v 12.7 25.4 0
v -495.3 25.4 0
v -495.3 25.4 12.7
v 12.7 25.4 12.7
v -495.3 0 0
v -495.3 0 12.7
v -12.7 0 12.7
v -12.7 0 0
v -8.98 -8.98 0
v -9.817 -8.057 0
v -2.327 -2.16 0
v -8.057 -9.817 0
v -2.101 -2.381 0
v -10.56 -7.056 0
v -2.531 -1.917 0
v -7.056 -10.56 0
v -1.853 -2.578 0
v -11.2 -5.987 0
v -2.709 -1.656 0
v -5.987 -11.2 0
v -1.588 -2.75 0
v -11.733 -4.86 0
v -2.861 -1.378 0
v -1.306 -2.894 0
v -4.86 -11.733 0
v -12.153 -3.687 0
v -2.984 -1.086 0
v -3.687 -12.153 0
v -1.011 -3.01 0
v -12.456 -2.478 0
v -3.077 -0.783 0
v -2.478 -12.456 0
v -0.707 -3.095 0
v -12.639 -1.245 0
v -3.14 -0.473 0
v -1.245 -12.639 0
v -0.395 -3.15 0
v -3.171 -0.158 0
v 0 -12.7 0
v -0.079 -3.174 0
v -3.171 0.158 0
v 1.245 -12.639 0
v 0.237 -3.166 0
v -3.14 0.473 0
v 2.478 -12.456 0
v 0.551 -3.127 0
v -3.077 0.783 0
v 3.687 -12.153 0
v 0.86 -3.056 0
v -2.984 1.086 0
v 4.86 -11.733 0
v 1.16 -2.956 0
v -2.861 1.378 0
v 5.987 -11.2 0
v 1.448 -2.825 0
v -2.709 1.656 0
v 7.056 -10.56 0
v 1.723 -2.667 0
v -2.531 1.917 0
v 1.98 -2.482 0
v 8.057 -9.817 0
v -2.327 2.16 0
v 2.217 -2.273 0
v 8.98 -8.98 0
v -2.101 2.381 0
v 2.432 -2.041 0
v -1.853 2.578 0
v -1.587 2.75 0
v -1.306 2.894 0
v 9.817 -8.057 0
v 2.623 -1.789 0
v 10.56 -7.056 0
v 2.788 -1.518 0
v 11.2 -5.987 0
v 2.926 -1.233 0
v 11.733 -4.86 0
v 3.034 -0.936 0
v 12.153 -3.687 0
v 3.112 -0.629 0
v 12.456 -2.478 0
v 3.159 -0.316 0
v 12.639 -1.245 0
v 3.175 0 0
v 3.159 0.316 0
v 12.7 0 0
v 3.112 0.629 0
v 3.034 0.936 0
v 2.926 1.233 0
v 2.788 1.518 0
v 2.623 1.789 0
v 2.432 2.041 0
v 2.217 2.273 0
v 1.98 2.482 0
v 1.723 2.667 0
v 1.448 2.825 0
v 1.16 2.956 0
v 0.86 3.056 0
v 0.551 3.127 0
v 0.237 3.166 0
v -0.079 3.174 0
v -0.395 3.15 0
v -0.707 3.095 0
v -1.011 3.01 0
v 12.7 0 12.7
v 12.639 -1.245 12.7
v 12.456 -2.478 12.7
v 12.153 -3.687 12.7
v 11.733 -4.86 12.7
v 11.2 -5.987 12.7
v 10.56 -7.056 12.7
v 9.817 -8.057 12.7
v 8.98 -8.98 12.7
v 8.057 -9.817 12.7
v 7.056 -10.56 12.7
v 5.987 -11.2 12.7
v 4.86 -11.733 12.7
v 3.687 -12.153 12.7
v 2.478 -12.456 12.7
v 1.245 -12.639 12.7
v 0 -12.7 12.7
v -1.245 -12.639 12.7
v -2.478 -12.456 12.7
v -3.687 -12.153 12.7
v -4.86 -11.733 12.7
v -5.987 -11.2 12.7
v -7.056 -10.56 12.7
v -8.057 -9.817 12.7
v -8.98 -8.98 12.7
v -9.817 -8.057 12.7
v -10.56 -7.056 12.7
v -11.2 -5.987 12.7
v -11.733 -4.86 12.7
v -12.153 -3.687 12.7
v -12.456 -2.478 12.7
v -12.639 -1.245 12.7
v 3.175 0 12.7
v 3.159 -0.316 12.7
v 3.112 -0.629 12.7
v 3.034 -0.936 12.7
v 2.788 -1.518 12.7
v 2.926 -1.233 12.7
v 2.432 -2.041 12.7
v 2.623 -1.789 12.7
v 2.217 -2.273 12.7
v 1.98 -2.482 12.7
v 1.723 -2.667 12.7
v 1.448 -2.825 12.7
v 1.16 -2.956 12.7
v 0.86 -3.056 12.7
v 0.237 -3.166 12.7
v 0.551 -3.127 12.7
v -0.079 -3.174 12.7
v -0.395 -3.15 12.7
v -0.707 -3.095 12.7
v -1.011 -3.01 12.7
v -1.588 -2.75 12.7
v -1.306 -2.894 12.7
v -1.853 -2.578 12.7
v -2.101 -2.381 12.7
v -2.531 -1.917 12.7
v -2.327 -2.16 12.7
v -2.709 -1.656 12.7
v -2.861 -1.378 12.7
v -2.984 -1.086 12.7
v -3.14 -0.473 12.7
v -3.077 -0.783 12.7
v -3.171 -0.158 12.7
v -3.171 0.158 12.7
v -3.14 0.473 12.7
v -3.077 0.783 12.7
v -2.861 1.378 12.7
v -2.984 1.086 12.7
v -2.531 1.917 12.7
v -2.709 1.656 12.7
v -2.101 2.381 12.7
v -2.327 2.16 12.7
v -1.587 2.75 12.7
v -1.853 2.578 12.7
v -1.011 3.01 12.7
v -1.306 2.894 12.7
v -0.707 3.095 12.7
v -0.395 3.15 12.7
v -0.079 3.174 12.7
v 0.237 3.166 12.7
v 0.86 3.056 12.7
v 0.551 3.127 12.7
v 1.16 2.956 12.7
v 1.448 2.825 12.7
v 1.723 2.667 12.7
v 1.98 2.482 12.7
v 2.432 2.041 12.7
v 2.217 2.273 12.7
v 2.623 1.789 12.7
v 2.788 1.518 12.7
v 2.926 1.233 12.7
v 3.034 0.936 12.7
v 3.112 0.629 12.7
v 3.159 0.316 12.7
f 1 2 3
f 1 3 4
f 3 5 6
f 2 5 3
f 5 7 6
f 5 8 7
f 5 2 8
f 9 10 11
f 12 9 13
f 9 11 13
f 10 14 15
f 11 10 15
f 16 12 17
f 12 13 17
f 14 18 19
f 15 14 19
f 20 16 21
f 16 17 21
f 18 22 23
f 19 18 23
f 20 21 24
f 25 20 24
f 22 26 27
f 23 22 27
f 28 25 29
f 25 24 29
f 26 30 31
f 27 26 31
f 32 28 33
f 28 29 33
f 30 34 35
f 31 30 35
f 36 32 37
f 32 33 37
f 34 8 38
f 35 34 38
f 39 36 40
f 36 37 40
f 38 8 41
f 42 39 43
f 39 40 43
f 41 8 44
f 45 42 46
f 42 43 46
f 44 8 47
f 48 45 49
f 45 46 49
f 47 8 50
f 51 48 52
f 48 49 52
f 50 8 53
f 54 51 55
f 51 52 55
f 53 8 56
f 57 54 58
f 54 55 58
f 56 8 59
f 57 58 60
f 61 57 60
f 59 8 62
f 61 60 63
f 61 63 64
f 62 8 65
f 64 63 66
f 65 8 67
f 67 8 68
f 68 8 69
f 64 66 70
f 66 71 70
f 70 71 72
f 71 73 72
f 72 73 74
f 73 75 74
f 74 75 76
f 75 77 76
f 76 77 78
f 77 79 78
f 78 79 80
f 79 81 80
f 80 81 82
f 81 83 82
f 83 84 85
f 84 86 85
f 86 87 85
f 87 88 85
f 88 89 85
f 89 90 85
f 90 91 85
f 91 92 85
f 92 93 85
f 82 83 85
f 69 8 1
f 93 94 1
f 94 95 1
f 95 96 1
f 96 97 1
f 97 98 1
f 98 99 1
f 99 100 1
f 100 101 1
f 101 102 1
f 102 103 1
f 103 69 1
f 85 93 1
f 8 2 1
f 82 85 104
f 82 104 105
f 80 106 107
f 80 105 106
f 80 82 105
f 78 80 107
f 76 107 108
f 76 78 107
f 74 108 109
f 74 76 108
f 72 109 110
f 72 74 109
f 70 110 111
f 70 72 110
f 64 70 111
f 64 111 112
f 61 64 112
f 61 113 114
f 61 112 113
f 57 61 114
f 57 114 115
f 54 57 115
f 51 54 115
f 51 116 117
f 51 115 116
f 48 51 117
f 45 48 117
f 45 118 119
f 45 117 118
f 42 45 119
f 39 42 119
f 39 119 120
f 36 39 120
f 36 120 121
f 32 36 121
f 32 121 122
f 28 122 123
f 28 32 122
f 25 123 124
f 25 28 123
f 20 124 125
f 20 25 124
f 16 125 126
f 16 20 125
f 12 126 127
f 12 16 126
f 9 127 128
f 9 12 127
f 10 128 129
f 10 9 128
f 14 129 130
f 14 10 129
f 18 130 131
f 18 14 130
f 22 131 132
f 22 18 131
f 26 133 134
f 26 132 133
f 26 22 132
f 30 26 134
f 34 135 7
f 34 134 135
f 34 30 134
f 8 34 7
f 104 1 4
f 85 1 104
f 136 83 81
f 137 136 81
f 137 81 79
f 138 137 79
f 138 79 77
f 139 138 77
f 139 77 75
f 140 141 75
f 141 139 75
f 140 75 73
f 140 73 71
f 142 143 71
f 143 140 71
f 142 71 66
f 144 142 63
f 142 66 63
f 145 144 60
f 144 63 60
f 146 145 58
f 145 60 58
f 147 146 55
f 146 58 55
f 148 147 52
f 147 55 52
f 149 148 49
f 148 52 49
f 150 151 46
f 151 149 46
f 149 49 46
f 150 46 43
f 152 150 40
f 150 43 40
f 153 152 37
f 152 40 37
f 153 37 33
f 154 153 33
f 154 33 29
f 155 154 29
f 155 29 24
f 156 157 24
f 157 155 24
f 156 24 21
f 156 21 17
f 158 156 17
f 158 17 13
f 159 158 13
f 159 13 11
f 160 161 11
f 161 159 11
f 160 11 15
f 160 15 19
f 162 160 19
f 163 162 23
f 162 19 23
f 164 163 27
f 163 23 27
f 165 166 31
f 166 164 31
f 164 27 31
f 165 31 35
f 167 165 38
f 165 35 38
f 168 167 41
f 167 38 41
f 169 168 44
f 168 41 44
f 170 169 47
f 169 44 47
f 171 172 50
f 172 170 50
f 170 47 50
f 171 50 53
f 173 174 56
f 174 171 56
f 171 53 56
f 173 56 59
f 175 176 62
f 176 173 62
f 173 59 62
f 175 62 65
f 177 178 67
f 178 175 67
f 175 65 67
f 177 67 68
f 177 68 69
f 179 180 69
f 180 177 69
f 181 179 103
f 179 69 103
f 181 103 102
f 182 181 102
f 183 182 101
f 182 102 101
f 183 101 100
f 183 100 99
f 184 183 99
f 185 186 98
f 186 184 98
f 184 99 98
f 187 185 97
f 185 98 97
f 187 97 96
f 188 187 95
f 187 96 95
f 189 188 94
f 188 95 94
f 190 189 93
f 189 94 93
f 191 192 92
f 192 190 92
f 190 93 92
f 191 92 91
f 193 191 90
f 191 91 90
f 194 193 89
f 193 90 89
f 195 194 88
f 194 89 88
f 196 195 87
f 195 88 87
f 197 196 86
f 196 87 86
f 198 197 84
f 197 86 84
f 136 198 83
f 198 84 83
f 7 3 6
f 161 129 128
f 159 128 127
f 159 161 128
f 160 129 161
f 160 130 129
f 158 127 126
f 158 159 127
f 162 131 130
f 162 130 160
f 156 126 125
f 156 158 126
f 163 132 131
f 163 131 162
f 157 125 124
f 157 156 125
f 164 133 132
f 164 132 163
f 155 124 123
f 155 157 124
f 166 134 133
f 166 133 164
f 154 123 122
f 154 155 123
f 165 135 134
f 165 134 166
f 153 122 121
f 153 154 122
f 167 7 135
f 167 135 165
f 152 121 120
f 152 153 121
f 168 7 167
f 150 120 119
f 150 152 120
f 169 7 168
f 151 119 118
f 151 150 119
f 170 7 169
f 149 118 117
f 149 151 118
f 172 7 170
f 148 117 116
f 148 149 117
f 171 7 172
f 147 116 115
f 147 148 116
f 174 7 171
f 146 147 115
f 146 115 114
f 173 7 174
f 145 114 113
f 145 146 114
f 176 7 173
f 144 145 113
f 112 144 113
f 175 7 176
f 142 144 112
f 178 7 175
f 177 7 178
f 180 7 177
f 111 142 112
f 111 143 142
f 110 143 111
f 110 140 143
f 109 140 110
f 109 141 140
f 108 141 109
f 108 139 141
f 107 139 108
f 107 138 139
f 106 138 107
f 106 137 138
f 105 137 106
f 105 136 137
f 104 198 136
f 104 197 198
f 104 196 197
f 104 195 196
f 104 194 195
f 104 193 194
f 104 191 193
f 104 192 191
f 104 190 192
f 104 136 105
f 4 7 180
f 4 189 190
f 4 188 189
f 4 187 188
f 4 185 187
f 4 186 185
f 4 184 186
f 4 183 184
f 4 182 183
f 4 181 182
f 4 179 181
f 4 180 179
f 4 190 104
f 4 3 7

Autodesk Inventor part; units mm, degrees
ref_plane "YZ Plane" through (0, 0, 0) normal (1, 0, 0) x (0, 1, 0)
ref_plane "XZ Plane" through (0, 0, 0) normal (0, 1, 0) x (-1, 0, 0)
ref_plane "XY Plane" through (0, 0, 0) normal (0, 0, 1) x (1, 0, 0)
sketch "Sketch1" plane through (0, 0, 0) normal (0, 0, 1) x (1, 0, 0)
  circle A0 centre (0, 0) radius 3.175
  circle A1 centre (0, 0) radius 12.7
  line L0 (-495.3, 0) -> (-495.3, 25.4)
  line L1 (-495.3, 25.4) -> (12.7, 25.4)
  line L2 (12.7, 25.4) -> (12.7, 0)
  line L3 (-12.7, 0) -> (-495.3, 0)
  dimension "d0" = 6.35
  dimension "d1" = 25.4
  dimension "d2" = 508
  dimension "d3" = 25.4
extrude "Extrusion1" add sketch "Sketch1" along normal blind 12.7
